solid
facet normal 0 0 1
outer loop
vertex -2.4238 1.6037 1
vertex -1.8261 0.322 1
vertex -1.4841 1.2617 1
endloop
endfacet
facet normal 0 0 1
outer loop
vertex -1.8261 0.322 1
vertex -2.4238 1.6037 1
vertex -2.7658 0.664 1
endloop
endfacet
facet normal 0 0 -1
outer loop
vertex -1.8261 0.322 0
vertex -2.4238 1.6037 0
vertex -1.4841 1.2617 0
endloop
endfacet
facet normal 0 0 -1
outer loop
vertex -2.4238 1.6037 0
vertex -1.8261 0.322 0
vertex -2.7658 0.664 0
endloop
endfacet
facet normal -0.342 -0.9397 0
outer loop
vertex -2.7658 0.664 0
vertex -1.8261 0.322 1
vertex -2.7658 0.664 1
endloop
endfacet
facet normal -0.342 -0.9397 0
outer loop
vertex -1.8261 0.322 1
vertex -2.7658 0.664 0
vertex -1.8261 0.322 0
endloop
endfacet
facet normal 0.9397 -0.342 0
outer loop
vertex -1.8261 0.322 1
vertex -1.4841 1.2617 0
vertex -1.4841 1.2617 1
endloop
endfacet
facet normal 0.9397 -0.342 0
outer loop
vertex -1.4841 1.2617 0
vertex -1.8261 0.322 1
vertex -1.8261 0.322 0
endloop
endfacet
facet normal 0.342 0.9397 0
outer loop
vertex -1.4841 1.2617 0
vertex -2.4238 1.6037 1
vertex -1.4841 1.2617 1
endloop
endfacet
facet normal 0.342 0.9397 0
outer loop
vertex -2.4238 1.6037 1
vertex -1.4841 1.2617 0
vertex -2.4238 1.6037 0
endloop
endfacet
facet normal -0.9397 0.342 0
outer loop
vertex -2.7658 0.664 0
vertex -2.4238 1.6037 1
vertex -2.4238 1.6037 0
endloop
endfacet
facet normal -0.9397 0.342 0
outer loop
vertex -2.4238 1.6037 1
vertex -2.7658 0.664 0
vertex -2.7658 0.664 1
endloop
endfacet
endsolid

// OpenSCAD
// A module that calls itself `steps` times, each step moved and turned.
// The comparison sets steps to 100 and to 150.
//
// SPDX-License-Identifier: GPL-3.0-or-later

steps = 100;

module step(n) {
    if (n > 0)
        translate([1, 0, 0]) rotate([0, 0, 7]) step(n - 1);
    else
        cube(1);
}

step(steps);
